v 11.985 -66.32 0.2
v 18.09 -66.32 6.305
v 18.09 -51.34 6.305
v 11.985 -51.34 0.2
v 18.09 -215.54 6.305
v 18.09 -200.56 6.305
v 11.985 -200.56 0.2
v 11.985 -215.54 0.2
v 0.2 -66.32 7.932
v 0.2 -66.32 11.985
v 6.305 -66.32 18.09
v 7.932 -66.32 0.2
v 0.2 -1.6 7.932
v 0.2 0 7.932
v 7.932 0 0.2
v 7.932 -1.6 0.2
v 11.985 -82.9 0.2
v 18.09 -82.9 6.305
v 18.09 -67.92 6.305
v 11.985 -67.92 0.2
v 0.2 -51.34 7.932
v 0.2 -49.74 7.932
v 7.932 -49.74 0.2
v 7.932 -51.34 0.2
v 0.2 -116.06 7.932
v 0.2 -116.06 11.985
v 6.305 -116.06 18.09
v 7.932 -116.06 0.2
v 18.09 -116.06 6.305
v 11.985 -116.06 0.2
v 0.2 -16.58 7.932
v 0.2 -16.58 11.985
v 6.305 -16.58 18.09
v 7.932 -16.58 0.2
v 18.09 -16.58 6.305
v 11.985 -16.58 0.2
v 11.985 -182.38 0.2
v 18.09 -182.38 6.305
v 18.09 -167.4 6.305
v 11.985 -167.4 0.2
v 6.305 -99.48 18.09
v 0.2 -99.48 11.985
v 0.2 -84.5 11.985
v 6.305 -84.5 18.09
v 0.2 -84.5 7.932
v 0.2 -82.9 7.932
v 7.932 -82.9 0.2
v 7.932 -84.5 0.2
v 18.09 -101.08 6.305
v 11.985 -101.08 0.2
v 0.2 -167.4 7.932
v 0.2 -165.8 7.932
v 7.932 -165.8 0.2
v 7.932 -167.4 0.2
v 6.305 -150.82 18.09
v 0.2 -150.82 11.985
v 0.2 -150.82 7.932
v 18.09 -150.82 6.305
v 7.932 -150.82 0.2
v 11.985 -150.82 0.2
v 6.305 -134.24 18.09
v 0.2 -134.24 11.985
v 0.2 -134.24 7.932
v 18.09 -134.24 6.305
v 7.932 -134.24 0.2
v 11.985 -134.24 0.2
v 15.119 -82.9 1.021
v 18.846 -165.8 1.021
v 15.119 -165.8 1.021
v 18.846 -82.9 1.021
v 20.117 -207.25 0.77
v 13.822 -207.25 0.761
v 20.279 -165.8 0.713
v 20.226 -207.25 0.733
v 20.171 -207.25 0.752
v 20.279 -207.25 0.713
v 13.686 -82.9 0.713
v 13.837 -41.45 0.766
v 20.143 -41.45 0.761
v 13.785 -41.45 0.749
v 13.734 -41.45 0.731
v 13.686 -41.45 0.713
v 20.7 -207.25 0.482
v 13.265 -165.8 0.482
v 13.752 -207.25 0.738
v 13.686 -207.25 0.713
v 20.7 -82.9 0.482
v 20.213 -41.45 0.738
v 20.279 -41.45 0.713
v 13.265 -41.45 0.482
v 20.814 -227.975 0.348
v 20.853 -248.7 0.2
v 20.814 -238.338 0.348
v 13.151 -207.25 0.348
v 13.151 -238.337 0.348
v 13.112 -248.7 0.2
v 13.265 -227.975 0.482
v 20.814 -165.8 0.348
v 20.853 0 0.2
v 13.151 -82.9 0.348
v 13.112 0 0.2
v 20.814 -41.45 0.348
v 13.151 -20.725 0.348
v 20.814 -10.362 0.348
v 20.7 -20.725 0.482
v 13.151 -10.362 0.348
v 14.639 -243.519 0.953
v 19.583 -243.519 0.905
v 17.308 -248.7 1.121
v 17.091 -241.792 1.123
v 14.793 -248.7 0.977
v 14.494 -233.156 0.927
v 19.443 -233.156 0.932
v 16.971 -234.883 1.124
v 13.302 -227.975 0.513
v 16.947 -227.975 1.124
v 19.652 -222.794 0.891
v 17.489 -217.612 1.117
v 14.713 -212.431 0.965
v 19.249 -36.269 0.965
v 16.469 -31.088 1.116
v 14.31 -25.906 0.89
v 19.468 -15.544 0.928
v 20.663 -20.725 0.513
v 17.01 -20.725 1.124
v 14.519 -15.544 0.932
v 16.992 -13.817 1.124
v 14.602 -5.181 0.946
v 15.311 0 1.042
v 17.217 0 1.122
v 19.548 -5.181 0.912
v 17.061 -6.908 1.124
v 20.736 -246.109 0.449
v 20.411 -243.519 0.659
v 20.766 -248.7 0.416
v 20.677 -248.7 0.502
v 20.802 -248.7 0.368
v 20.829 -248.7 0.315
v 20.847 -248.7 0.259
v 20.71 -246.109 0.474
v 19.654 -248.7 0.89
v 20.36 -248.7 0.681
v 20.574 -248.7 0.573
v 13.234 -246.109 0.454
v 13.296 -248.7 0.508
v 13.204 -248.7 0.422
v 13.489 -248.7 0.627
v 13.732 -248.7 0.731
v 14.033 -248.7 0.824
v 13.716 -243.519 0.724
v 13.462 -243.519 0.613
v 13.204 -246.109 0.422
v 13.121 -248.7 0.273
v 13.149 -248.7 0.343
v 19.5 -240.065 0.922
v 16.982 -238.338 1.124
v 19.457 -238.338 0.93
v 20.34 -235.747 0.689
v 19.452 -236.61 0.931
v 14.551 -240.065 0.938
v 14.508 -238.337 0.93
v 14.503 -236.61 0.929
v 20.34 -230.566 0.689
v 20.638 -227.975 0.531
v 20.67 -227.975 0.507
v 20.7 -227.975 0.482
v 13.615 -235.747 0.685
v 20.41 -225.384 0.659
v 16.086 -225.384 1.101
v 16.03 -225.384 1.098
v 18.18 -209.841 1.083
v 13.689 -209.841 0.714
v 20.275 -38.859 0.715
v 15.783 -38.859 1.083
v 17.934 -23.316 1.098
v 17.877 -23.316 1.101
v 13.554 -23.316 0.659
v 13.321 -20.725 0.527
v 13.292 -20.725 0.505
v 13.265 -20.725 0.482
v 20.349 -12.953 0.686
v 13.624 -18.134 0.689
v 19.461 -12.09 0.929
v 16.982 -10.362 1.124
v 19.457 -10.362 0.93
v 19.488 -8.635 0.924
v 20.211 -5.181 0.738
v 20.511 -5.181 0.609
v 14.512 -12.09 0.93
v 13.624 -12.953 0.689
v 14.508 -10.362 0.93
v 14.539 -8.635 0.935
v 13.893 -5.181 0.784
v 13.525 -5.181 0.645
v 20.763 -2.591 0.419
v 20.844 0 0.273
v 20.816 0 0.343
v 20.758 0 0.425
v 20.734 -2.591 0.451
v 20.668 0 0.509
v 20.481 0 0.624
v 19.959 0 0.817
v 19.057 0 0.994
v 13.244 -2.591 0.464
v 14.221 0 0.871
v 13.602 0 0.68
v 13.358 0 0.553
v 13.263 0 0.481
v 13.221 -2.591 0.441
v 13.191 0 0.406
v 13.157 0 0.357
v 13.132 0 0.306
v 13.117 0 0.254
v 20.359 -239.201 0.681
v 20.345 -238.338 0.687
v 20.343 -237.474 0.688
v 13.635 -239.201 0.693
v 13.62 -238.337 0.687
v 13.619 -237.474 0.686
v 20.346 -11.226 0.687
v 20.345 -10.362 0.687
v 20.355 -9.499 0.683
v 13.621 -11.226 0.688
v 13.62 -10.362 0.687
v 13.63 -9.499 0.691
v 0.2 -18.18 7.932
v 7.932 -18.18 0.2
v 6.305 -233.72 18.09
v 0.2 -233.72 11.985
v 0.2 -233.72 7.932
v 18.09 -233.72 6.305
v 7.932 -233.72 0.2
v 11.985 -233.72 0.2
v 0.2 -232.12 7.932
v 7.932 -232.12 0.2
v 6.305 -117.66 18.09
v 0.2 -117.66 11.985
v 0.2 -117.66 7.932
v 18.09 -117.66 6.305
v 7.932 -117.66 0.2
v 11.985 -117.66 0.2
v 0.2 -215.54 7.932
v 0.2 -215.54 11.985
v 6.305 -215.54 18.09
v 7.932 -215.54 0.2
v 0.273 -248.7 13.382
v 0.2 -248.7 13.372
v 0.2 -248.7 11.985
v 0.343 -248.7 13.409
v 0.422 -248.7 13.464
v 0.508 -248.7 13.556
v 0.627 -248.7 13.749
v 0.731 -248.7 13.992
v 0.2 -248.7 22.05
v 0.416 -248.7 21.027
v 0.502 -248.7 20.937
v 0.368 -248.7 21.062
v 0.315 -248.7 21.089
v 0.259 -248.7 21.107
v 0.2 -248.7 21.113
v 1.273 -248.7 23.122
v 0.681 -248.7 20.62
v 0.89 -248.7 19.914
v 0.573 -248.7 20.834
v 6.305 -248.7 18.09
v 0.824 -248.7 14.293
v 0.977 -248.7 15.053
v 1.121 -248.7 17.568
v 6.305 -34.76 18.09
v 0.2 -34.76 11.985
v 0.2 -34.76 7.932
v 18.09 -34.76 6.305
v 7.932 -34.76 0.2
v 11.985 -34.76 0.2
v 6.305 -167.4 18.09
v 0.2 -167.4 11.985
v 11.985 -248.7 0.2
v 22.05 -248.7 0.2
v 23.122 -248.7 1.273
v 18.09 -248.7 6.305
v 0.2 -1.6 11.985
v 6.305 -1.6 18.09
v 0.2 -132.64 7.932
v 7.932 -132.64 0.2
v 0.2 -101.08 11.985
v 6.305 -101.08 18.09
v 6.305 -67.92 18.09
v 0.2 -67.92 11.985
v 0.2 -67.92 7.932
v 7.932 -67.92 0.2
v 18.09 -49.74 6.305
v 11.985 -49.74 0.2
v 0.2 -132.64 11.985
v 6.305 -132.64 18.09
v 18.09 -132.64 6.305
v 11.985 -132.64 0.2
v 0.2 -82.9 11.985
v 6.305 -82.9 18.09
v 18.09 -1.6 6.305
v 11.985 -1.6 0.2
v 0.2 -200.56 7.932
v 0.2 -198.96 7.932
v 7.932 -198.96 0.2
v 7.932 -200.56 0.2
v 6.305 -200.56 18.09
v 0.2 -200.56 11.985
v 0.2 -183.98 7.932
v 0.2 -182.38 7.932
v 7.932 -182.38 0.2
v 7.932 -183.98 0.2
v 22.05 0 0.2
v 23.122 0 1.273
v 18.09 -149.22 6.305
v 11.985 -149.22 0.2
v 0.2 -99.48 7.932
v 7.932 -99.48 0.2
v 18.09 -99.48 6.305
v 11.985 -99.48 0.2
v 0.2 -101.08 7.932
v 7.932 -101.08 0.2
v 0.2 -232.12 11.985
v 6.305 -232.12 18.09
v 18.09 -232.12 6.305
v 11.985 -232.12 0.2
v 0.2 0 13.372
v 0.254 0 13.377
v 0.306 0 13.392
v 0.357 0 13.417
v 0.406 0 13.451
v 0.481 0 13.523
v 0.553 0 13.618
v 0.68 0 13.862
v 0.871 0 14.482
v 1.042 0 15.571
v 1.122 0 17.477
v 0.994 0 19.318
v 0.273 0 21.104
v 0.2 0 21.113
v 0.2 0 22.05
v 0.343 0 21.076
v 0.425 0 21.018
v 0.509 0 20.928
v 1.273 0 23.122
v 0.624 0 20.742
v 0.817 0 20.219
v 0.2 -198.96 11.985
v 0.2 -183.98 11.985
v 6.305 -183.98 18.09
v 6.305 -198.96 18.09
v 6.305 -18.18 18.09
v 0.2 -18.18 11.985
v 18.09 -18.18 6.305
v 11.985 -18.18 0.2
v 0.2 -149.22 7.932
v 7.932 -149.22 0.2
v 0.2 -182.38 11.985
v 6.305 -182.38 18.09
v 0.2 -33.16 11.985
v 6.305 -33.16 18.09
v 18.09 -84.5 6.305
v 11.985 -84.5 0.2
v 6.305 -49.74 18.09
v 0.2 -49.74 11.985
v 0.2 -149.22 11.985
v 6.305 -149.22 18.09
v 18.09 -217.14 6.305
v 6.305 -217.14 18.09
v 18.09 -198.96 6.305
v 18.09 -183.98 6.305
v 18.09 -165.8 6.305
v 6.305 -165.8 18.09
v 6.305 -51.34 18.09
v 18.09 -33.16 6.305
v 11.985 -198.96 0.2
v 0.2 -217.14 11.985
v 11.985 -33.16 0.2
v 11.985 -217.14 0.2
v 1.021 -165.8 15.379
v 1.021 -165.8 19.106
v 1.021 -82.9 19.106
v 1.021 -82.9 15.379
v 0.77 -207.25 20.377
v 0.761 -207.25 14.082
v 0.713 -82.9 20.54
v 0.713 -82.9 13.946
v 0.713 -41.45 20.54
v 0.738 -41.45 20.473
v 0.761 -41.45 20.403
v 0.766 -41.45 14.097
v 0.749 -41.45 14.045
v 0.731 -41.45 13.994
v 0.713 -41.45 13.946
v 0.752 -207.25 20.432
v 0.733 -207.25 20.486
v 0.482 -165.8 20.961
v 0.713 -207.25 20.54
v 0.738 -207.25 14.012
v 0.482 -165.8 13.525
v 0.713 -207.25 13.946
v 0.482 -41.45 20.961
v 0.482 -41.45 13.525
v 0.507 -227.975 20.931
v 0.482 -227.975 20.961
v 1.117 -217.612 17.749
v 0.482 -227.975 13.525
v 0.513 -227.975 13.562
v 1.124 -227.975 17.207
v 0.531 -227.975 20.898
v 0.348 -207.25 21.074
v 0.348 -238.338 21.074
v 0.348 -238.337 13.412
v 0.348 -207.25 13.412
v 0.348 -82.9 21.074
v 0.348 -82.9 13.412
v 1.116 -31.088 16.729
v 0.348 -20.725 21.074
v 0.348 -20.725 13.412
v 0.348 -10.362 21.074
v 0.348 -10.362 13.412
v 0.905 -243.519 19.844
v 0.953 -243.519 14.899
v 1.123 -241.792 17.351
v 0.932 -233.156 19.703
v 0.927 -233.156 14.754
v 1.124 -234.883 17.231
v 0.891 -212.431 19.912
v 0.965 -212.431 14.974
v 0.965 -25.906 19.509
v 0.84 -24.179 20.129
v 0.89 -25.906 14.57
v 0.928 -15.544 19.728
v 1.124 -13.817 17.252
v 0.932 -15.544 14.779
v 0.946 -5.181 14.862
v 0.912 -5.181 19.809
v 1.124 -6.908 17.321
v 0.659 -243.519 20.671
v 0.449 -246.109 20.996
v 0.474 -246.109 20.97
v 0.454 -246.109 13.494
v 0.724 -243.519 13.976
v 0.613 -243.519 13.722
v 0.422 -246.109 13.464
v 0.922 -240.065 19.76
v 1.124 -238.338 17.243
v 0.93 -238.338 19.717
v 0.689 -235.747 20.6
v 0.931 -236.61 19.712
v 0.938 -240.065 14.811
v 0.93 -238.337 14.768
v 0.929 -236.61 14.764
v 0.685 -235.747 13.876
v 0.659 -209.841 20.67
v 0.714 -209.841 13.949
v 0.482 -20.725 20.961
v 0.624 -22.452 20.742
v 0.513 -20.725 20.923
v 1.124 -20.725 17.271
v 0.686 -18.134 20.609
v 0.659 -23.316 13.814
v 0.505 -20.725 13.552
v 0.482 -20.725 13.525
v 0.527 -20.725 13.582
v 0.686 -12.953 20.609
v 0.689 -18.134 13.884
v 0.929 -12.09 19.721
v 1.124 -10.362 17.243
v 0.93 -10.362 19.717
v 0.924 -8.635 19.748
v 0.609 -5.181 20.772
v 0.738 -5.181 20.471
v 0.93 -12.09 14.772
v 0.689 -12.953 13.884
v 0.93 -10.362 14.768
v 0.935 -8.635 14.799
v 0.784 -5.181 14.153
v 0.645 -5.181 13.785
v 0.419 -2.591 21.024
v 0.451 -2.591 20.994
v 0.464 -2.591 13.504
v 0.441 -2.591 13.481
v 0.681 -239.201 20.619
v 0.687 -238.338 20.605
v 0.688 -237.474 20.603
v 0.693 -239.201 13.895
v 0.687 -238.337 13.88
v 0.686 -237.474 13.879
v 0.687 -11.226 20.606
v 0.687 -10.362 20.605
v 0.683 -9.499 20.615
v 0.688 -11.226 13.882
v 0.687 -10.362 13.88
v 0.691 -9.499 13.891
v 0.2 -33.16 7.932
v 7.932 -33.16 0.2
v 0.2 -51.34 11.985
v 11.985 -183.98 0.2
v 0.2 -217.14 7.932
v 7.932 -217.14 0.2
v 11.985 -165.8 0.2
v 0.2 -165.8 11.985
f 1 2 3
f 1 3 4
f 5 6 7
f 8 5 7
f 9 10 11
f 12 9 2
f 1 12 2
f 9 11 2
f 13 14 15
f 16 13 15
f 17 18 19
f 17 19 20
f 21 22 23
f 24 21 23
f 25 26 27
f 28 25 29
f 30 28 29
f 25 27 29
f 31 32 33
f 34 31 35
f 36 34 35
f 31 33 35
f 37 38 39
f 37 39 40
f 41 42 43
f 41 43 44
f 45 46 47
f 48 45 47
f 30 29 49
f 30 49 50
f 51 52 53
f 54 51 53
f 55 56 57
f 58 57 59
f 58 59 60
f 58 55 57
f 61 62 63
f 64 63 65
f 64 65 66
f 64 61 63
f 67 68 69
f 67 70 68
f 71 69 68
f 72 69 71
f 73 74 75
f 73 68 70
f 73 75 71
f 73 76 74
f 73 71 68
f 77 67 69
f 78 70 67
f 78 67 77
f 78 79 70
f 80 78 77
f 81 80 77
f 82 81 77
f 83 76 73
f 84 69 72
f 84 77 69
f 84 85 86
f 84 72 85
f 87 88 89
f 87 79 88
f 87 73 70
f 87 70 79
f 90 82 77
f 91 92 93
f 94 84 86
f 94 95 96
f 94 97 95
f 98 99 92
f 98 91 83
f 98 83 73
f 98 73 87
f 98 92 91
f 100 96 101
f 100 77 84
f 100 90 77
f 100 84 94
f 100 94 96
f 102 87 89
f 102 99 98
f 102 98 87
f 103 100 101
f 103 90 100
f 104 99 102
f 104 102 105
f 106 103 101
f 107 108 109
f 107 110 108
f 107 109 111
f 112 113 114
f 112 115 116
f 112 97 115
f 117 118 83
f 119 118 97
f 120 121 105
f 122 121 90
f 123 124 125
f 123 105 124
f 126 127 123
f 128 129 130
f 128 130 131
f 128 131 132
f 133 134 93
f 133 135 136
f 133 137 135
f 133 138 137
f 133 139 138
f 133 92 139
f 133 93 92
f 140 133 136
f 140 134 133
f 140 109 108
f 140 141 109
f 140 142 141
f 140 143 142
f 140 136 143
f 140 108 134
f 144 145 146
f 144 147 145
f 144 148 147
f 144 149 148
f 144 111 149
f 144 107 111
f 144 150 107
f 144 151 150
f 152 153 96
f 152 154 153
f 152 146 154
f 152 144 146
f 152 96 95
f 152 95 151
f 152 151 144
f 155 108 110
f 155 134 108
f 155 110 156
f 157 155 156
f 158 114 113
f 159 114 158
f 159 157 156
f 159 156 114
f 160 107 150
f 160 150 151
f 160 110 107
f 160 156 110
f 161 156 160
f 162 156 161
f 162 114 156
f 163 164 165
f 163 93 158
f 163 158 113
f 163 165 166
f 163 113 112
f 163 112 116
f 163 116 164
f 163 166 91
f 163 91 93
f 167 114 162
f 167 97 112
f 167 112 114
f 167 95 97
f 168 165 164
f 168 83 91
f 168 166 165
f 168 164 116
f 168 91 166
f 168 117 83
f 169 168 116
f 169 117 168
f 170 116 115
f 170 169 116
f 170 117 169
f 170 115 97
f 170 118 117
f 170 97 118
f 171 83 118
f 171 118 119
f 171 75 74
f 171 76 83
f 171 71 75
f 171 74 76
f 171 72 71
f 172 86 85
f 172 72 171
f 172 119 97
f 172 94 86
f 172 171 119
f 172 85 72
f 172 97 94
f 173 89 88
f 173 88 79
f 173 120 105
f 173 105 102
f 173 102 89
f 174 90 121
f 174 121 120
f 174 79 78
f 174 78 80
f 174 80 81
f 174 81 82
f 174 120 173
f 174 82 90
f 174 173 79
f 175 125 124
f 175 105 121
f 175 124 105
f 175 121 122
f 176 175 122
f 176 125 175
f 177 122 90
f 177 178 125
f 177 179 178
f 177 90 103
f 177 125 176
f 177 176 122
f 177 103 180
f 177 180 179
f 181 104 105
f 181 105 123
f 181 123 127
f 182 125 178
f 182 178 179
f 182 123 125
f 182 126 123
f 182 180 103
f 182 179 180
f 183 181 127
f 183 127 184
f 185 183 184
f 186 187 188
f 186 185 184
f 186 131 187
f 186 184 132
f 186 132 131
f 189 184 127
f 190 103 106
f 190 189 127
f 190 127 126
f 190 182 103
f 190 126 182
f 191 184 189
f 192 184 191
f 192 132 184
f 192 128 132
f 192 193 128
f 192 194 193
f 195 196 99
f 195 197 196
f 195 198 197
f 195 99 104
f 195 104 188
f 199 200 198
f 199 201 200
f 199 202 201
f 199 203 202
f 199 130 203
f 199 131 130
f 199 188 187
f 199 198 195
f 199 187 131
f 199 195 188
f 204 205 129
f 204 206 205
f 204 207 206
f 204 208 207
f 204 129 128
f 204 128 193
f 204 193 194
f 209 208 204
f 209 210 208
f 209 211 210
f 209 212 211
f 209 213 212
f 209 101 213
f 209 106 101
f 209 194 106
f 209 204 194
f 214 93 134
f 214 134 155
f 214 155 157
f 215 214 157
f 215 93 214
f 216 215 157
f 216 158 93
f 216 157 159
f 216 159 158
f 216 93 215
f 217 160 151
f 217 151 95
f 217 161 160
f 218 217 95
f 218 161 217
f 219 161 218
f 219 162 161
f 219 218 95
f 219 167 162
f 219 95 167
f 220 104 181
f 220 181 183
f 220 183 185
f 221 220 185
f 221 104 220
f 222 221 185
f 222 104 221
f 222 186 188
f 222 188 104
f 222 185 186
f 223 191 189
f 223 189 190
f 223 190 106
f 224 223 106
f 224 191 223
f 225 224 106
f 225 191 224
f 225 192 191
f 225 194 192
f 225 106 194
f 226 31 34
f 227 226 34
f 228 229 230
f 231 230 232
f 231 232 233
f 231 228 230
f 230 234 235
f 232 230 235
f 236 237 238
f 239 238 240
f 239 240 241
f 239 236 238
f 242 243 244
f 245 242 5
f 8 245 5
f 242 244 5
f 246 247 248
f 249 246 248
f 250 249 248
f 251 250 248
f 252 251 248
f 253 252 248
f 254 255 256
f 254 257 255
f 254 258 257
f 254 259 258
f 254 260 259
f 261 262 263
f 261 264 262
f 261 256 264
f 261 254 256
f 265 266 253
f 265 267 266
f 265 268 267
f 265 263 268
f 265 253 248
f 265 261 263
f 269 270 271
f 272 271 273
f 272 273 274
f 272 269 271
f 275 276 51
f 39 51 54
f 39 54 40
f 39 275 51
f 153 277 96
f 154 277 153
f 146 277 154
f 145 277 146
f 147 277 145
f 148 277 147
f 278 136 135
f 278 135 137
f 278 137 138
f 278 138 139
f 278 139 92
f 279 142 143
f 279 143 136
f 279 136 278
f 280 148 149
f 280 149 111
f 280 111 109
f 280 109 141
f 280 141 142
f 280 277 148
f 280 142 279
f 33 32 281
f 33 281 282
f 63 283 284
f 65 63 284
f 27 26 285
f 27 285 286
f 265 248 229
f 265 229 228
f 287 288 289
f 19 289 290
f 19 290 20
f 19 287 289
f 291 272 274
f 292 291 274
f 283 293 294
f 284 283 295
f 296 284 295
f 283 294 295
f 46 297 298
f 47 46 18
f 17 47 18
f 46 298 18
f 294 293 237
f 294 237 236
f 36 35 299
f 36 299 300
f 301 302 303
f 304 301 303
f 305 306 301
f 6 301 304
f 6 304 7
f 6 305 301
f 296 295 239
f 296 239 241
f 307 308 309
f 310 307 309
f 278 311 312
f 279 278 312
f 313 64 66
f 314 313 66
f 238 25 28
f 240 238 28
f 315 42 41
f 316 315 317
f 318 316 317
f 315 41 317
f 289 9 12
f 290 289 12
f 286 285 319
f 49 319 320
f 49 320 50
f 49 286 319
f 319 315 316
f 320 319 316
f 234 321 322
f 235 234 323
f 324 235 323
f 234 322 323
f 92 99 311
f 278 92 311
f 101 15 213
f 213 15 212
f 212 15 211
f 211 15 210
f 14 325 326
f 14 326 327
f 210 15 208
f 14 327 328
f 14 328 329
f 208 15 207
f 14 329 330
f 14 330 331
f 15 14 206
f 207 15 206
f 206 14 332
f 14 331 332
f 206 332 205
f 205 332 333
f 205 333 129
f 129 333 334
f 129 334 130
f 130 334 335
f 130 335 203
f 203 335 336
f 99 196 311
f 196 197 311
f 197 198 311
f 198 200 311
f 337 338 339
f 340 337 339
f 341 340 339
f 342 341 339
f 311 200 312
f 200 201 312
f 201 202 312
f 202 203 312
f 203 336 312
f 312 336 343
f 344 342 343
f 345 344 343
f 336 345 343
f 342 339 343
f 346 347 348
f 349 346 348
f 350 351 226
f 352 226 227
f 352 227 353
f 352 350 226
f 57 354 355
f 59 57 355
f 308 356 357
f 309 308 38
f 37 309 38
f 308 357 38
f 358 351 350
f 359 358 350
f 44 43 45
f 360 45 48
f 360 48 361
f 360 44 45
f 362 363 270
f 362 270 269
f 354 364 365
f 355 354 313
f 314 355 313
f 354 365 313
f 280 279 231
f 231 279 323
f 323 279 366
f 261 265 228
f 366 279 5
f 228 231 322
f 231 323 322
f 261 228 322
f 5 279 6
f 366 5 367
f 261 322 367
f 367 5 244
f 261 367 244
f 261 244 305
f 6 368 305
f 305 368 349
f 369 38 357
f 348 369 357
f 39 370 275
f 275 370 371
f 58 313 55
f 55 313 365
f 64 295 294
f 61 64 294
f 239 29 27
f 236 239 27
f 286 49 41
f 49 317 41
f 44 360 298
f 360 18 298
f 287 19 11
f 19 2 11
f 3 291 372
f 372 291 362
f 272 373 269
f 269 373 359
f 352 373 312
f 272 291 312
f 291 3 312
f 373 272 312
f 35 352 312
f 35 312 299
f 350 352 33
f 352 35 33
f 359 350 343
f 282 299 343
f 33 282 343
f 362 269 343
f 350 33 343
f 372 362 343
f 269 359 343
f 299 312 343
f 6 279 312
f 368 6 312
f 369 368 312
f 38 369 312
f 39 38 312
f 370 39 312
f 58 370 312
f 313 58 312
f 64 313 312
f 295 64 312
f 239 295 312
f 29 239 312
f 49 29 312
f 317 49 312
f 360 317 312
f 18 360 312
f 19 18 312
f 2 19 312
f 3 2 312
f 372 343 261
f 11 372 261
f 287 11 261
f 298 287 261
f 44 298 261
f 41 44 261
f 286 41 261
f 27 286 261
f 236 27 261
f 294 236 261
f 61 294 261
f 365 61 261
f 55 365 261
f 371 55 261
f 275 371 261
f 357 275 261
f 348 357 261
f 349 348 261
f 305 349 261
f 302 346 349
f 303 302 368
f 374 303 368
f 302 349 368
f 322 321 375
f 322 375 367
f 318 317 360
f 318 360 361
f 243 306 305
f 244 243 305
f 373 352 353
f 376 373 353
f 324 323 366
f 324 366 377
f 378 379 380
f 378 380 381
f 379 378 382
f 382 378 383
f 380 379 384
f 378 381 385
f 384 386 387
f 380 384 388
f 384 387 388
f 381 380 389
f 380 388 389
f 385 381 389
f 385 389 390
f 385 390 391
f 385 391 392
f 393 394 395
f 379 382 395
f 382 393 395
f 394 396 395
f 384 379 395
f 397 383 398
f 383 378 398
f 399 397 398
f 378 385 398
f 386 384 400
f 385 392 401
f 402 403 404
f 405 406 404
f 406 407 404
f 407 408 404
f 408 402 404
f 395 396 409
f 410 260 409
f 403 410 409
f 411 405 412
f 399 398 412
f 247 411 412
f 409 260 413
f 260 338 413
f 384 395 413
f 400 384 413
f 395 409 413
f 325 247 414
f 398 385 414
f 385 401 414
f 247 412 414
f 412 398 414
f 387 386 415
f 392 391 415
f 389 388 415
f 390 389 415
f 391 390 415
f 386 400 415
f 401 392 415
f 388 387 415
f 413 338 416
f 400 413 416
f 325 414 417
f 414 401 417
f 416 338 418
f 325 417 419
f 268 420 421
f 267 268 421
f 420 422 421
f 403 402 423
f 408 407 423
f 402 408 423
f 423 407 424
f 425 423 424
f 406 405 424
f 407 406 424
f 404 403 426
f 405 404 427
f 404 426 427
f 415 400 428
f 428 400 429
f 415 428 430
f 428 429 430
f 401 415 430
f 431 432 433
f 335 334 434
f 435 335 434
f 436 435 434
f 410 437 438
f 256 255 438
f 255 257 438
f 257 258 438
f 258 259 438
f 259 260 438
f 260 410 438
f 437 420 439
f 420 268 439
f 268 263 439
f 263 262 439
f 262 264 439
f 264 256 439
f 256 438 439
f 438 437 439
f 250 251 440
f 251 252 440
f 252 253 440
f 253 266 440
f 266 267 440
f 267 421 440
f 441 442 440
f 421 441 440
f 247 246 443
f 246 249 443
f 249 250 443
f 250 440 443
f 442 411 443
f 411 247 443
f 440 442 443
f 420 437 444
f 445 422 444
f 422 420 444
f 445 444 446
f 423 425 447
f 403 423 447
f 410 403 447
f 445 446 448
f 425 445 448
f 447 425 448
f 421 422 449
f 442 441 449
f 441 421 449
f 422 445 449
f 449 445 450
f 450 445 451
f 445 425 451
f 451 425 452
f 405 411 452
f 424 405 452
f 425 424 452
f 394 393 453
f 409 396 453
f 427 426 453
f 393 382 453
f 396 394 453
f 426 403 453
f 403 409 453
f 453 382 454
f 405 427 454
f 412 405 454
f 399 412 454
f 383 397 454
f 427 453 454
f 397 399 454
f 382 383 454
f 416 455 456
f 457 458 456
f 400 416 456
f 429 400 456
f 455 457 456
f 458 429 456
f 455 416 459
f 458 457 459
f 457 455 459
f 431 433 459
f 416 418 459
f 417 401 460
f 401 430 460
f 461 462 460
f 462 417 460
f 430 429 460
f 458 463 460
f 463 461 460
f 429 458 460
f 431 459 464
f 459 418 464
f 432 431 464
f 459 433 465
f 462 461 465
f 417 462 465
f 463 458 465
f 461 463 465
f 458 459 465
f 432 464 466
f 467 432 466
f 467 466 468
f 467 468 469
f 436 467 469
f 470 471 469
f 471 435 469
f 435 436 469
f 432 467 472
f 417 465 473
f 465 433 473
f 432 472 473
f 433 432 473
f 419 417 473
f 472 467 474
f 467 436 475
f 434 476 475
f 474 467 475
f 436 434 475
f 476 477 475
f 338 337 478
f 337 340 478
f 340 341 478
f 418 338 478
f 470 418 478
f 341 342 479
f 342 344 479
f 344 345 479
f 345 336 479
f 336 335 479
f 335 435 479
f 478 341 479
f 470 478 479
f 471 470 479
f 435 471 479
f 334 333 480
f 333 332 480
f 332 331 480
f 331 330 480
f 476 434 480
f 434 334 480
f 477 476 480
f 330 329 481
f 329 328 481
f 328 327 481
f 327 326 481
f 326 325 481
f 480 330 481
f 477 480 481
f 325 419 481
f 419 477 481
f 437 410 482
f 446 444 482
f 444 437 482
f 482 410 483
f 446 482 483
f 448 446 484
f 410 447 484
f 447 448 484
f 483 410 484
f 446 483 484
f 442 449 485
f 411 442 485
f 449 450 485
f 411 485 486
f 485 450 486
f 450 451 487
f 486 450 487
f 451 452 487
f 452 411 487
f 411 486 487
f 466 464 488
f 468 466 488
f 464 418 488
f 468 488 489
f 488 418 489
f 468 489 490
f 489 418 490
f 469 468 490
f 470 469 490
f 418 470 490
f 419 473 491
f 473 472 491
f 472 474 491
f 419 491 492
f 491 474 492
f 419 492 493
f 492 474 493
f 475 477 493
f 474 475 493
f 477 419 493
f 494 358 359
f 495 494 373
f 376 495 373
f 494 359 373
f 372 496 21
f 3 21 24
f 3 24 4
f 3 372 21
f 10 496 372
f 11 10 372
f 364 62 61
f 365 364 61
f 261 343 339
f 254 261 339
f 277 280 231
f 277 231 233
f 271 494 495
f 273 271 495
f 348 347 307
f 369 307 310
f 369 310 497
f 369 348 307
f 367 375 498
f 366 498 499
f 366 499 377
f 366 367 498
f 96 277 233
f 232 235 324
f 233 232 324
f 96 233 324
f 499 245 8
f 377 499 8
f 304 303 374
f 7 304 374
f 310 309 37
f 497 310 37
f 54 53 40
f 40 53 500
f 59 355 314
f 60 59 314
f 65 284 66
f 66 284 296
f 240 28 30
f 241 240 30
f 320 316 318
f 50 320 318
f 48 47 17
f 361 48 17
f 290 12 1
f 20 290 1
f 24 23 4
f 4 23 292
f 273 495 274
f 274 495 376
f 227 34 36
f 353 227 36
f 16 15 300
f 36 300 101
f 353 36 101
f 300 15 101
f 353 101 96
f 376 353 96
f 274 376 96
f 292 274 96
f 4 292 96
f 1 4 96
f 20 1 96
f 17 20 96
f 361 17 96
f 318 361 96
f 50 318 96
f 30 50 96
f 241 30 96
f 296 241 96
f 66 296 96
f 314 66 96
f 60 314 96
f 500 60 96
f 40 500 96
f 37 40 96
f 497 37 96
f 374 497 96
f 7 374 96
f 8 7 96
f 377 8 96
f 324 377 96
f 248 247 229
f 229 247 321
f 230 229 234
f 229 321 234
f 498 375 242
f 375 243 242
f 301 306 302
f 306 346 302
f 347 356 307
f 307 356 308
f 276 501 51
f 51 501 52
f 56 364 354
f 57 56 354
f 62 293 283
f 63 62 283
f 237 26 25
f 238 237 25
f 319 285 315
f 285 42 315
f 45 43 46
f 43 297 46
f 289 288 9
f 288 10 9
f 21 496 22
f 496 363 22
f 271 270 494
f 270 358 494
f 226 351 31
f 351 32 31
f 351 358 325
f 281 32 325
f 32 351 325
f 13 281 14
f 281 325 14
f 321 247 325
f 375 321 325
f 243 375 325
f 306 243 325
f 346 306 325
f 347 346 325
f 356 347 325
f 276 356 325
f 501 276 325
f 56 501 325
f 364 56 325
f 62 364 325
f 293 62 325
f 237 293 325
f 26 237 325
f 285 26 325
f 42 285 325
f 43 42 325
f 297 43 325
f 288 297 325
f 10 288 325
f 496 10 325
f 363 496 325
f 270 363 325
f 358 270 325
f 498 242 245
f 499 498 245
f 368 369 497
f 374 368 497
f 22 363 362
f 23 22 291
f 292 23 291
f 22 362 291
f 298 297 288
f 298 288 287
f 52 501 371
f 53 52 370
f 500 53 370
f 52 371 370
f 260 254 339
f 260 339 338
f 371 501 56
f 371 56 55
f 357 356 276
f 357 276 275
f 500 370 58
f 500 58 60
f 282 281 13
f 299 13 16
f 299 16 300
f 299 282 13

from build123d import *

# Parameters (mm, degrees)
PAD001_DEPTH        = 1.6
PAD002_DEPTH        = 248.7
LINEARPATTERN_COUNT = 15
LINEARPATTERN_PITCH = 16.58
POCKET_DEPTH        = 248.701


with BuildPart() as part:
    # Sketch001 → Pad001 (new body)
    with BuildSketch(Plane.XZ):
        Polygon((1.272792, 23.122392), (0.2, 22.0496), (0.2, 7.931728), (7.931728, 0.2), (22.0496, 0.2), (23.122392, 1.272792), align=None)
    pad001 = extrude(amount=PAD001_DEPTH)

    # Sketch002 → Pad002 (join)
    with BuildSketch(Plane.XZ):
        Polygon((1.272792, 23.122392), (0.2, 22.0496), (0.2, 11.985349), (6.304918, 18.090266), align=None)
        Polygon((23.122392, 1.272792), (18.090266, 6.304918), (11.985349, 0.2), (22.0496, 0.2), align=None)
    extrude(amount=PAD002_DEPTH)

    # LinearPattern: Pad001 ×15
    with Locations(*[(0, -i * LINEARPATTERN_PITCH, 0) for i in range(1, LINEARPATTERN_COUNT)]):
        add(pad001)

    # Sketch003 → Pocket (cut, through all)
    with BuildSketch(Plane.XZ):
        with BuildLine():
            add(Edge.make_bspline(
                [(0.2, 21.112906), (1.431644, 21.112906), (1.431644, 13.372407), (0.2, 13.372407)],
                knots=[0, 0, 0, 0, 1, 1, 1, 1], degree=3))
            Line((0.2, 13.372407), (0.2, 21.112906))
        make_face()
        with BuildLine():
            add(Edge.make_bspline(
                [(20.852737, 0.2), (20.852737, 1.431644), (13.112238, 1.431644), (13.112238, 0.2)],
                knots=[0, 0, 0, 0, 1, 1, 1, 1], degree=3))
            Line((13.112238, 0.2), (20.852737, 0.2))
        make_face()
    extrude(amount=POCKET_DEPTH, mode=Mode.SUBTRACT)


solid = part.part
